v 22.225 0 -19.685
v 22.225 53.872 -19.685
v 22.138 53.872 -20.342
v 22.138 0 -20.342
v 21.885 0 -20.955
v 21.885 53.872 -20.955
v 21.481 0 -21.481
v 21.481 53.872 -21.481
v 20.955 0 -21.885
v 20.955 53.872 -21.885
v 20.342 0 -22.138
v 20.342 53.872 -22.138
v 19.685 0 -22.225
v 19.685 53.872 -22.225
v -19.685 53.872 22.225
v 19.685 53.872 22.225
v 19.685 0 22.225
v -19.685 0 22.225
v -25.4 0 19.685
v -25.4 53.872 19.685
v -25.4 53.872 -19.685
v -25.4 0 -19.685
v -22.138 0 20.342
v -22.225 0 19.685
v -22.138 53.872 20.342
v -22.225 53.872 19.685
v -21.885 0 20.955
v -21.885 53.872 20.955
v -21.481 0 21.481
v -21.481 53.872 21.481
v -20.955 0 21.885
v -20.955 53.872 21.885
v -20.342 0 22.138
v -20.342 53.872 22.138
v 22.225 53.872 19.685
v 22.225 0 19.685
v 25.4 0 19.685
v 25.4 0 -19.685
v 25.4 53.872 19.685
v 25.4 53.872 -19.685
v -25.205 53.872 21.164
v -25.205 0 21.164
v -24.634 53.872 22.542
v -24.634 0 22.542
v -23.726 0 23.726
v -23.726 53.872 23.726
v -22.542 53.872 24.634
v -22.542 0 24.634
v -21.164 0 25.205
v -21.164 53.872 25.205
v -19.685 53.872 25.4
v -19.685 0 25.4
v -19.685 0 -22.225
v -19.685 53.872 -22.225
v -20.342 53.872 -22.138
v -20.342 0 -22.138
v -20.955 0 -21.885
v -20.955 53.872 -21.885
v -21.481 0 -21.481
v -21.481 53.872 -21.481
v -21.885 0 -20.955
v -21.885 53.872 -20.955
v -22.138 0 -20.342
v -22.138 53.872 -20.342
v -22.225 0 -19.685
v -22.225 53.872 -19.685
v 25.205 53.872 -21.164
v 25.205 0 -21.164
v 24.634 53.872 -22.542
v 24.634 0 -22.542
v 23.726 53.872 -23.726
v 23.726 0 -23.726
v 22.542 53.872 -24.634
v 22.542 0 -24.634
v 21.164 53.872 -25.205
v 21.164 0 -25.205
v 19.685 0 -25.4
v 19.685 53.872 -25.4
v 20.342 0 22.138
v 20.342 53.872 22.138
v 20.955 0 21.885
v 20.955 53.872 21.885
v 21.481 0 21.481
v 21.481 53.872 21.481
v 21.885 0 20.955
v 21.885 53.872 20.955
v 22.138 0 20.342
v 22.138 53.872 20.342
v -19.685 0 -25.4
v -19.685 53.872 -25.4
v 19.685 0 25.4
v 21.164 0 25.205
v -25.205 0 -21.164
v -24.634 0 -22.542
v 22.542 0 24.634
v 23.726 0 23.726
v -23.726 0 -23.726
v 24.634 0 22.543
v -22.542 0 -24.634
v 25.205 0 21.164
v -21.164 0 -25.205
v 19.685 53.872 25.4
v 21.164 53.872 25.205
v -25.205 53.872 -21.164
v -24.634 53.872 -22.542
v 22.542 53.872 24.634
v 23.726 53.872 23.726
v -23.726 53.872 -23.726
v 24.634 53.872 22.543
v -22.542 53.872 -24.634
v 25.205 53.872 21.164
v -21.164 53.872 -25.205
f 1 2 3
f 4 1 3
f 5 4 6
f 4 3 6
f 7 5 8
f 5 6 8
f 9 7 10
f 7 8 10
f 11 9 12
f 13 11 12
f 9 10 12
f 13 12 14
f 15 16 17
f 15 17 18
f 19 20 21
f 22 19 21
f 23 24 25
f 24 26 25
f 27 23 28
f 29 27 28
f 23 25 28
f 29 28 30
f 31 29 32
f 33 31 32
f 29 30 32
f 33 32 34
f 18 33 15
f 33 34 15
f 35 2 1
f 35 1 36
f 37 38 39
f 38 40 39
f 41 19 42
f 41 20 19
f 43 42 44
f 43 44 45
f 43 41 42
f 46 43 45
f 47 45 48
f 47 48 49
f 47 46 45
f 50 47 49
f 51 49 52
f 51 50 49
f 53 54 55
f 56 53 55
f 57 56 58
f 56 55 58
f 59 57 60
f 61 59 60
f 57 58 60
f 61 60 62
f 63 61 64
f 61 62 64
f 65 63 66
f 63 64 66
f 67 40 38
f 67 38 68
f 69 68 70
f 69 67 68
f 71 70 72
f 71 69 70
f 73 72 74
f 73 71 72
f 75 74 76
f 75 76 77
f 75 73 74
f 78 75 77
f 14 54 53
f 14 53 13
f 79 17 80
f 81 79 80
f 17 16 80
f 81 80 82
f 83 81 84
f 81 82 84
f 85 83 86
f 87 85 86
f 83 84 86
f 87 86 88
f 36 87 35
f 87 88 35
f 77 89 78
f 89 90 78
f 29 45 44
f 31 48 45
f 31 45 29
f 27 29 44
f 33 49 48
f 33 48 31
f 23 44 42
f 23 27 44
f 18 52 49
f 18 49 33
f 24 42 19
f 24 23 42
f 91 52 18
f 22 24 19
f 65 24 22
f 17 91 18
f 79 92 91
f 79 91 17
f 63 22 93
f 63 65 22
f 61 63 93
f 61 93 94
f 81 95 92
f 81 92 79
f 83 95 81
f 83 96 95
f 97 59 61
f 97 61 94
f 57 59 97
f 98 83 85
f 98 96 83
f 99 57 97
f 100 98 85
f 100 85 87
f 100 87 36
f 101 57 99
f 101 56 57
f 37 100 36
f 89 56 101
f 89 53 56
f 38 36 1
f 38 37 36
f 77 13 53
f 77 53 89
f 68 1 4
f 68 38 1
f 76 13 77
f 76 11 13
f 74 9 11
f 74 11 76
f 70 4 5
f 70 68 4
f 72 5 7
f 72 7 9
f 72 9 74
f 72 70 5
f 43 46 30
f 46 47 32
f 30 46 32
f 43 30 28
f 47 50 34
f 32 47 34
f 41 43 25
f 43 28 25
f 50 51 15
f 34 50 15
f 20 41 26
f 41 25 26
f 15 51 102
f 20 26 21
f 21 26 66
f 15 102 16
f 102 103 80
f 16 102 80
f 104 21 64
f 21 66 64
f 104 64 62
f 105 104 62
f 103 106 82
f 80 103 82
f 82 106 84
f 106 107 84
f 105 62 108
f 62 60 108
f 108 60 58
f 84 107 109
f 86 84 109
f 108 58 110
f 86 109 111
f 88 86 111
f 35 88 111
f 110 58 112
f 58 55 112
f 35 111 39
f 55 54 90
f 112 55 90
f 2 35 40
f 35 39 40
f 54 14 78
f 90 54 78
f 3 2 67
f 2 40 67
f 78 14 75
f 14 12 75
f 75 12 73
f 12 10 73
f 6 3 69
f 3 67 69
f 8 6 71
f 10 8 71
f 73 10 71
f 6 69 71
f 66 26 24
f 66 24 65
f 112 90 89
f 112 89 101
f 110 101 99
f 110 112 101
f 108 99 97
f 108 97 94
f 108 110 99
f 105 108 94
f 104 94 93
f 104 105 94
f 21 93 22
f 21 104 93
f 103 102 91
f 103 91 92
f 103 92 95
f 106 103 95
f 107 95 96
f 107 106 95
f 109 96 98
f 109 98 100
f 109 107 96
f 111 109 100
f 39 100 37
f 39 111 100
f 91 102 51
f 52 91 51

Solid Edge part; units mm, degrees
sketch "Sketch1" plane through (0, 0, 0) normal (1, 0, 0) x (0, 1, 0)
  line L0 (0, 0) -> (53.8724, 0)
sketch "Sketch2" plane through (0, 0, 0) normal (0, -1, 0) x (1, 0, 0)
  line L0 (25.4, -19.685) -> (25.4, 19.685)
  arc A0 (19.685, 25.4) -> (25.4, 19.685) centre (19.685, 19.685) cw
  line L1 (19.685, 25.4) -> (-19.685, 25.4)
  arc A1 (-19.685, 25.4) -> (-25.4, 19.685) centre (-19.685, 19.685) ccw
  line L2 (-25.4, 19.685) -> (-25.4, -19.685)
  arc A2 (-25.4, -19.685) -> (-19.685, -25.4) centre (-19.685, -19.685) ccw
  line L3 (-19.685, -25.4) -> (19.685, -25.4)
  arc A3 (19.685, -25.4) -> (25.4, -19.685) centre (19.685, -19.685) ccw
sweep "Protrusion_1" add profiles "Sketch2" path "Sketch1"
sketch "Sketch3" plane through (0, 0, 0) normal (1, 0, 0) x (0, 1, 0)
  line L0 (0, 0) -> (53.8724, 0)
sketch "Sketch4" plane through (0, 0, 0) normal (0, -1, 0) x (1, 0, 0)
  line L0 (-19.685, -22.225) -> (19.685, -22.225)
  arc A0 (19.685, -22.225) -> (22.225, -19.685) centre (19.685, -19.685) ccw
  line L1 (22.225, -19.685) -> (22.225, 19.685)
  arc A1 (22.225, 19.685) -> (19.685, 22.225) centre (19.685, 19.685) ccw
  line L2 (19.685, 22.225) -> (-19.685, 22.225)
  arc A2 (-19.685, 22.225) -> (-22.225, 19.685) centre (-19.685, 19.685) ccw
  line L3 (-22.225, 19.685) -> (-22.225, -19.685)
  arc A3 (-22.225, -19.685) -> (-19.685, -22.225) centre (-19.685, -19.685) ccw
sweep "Cutout_1" cut profiles "Sketch4" path "Sketch3"
